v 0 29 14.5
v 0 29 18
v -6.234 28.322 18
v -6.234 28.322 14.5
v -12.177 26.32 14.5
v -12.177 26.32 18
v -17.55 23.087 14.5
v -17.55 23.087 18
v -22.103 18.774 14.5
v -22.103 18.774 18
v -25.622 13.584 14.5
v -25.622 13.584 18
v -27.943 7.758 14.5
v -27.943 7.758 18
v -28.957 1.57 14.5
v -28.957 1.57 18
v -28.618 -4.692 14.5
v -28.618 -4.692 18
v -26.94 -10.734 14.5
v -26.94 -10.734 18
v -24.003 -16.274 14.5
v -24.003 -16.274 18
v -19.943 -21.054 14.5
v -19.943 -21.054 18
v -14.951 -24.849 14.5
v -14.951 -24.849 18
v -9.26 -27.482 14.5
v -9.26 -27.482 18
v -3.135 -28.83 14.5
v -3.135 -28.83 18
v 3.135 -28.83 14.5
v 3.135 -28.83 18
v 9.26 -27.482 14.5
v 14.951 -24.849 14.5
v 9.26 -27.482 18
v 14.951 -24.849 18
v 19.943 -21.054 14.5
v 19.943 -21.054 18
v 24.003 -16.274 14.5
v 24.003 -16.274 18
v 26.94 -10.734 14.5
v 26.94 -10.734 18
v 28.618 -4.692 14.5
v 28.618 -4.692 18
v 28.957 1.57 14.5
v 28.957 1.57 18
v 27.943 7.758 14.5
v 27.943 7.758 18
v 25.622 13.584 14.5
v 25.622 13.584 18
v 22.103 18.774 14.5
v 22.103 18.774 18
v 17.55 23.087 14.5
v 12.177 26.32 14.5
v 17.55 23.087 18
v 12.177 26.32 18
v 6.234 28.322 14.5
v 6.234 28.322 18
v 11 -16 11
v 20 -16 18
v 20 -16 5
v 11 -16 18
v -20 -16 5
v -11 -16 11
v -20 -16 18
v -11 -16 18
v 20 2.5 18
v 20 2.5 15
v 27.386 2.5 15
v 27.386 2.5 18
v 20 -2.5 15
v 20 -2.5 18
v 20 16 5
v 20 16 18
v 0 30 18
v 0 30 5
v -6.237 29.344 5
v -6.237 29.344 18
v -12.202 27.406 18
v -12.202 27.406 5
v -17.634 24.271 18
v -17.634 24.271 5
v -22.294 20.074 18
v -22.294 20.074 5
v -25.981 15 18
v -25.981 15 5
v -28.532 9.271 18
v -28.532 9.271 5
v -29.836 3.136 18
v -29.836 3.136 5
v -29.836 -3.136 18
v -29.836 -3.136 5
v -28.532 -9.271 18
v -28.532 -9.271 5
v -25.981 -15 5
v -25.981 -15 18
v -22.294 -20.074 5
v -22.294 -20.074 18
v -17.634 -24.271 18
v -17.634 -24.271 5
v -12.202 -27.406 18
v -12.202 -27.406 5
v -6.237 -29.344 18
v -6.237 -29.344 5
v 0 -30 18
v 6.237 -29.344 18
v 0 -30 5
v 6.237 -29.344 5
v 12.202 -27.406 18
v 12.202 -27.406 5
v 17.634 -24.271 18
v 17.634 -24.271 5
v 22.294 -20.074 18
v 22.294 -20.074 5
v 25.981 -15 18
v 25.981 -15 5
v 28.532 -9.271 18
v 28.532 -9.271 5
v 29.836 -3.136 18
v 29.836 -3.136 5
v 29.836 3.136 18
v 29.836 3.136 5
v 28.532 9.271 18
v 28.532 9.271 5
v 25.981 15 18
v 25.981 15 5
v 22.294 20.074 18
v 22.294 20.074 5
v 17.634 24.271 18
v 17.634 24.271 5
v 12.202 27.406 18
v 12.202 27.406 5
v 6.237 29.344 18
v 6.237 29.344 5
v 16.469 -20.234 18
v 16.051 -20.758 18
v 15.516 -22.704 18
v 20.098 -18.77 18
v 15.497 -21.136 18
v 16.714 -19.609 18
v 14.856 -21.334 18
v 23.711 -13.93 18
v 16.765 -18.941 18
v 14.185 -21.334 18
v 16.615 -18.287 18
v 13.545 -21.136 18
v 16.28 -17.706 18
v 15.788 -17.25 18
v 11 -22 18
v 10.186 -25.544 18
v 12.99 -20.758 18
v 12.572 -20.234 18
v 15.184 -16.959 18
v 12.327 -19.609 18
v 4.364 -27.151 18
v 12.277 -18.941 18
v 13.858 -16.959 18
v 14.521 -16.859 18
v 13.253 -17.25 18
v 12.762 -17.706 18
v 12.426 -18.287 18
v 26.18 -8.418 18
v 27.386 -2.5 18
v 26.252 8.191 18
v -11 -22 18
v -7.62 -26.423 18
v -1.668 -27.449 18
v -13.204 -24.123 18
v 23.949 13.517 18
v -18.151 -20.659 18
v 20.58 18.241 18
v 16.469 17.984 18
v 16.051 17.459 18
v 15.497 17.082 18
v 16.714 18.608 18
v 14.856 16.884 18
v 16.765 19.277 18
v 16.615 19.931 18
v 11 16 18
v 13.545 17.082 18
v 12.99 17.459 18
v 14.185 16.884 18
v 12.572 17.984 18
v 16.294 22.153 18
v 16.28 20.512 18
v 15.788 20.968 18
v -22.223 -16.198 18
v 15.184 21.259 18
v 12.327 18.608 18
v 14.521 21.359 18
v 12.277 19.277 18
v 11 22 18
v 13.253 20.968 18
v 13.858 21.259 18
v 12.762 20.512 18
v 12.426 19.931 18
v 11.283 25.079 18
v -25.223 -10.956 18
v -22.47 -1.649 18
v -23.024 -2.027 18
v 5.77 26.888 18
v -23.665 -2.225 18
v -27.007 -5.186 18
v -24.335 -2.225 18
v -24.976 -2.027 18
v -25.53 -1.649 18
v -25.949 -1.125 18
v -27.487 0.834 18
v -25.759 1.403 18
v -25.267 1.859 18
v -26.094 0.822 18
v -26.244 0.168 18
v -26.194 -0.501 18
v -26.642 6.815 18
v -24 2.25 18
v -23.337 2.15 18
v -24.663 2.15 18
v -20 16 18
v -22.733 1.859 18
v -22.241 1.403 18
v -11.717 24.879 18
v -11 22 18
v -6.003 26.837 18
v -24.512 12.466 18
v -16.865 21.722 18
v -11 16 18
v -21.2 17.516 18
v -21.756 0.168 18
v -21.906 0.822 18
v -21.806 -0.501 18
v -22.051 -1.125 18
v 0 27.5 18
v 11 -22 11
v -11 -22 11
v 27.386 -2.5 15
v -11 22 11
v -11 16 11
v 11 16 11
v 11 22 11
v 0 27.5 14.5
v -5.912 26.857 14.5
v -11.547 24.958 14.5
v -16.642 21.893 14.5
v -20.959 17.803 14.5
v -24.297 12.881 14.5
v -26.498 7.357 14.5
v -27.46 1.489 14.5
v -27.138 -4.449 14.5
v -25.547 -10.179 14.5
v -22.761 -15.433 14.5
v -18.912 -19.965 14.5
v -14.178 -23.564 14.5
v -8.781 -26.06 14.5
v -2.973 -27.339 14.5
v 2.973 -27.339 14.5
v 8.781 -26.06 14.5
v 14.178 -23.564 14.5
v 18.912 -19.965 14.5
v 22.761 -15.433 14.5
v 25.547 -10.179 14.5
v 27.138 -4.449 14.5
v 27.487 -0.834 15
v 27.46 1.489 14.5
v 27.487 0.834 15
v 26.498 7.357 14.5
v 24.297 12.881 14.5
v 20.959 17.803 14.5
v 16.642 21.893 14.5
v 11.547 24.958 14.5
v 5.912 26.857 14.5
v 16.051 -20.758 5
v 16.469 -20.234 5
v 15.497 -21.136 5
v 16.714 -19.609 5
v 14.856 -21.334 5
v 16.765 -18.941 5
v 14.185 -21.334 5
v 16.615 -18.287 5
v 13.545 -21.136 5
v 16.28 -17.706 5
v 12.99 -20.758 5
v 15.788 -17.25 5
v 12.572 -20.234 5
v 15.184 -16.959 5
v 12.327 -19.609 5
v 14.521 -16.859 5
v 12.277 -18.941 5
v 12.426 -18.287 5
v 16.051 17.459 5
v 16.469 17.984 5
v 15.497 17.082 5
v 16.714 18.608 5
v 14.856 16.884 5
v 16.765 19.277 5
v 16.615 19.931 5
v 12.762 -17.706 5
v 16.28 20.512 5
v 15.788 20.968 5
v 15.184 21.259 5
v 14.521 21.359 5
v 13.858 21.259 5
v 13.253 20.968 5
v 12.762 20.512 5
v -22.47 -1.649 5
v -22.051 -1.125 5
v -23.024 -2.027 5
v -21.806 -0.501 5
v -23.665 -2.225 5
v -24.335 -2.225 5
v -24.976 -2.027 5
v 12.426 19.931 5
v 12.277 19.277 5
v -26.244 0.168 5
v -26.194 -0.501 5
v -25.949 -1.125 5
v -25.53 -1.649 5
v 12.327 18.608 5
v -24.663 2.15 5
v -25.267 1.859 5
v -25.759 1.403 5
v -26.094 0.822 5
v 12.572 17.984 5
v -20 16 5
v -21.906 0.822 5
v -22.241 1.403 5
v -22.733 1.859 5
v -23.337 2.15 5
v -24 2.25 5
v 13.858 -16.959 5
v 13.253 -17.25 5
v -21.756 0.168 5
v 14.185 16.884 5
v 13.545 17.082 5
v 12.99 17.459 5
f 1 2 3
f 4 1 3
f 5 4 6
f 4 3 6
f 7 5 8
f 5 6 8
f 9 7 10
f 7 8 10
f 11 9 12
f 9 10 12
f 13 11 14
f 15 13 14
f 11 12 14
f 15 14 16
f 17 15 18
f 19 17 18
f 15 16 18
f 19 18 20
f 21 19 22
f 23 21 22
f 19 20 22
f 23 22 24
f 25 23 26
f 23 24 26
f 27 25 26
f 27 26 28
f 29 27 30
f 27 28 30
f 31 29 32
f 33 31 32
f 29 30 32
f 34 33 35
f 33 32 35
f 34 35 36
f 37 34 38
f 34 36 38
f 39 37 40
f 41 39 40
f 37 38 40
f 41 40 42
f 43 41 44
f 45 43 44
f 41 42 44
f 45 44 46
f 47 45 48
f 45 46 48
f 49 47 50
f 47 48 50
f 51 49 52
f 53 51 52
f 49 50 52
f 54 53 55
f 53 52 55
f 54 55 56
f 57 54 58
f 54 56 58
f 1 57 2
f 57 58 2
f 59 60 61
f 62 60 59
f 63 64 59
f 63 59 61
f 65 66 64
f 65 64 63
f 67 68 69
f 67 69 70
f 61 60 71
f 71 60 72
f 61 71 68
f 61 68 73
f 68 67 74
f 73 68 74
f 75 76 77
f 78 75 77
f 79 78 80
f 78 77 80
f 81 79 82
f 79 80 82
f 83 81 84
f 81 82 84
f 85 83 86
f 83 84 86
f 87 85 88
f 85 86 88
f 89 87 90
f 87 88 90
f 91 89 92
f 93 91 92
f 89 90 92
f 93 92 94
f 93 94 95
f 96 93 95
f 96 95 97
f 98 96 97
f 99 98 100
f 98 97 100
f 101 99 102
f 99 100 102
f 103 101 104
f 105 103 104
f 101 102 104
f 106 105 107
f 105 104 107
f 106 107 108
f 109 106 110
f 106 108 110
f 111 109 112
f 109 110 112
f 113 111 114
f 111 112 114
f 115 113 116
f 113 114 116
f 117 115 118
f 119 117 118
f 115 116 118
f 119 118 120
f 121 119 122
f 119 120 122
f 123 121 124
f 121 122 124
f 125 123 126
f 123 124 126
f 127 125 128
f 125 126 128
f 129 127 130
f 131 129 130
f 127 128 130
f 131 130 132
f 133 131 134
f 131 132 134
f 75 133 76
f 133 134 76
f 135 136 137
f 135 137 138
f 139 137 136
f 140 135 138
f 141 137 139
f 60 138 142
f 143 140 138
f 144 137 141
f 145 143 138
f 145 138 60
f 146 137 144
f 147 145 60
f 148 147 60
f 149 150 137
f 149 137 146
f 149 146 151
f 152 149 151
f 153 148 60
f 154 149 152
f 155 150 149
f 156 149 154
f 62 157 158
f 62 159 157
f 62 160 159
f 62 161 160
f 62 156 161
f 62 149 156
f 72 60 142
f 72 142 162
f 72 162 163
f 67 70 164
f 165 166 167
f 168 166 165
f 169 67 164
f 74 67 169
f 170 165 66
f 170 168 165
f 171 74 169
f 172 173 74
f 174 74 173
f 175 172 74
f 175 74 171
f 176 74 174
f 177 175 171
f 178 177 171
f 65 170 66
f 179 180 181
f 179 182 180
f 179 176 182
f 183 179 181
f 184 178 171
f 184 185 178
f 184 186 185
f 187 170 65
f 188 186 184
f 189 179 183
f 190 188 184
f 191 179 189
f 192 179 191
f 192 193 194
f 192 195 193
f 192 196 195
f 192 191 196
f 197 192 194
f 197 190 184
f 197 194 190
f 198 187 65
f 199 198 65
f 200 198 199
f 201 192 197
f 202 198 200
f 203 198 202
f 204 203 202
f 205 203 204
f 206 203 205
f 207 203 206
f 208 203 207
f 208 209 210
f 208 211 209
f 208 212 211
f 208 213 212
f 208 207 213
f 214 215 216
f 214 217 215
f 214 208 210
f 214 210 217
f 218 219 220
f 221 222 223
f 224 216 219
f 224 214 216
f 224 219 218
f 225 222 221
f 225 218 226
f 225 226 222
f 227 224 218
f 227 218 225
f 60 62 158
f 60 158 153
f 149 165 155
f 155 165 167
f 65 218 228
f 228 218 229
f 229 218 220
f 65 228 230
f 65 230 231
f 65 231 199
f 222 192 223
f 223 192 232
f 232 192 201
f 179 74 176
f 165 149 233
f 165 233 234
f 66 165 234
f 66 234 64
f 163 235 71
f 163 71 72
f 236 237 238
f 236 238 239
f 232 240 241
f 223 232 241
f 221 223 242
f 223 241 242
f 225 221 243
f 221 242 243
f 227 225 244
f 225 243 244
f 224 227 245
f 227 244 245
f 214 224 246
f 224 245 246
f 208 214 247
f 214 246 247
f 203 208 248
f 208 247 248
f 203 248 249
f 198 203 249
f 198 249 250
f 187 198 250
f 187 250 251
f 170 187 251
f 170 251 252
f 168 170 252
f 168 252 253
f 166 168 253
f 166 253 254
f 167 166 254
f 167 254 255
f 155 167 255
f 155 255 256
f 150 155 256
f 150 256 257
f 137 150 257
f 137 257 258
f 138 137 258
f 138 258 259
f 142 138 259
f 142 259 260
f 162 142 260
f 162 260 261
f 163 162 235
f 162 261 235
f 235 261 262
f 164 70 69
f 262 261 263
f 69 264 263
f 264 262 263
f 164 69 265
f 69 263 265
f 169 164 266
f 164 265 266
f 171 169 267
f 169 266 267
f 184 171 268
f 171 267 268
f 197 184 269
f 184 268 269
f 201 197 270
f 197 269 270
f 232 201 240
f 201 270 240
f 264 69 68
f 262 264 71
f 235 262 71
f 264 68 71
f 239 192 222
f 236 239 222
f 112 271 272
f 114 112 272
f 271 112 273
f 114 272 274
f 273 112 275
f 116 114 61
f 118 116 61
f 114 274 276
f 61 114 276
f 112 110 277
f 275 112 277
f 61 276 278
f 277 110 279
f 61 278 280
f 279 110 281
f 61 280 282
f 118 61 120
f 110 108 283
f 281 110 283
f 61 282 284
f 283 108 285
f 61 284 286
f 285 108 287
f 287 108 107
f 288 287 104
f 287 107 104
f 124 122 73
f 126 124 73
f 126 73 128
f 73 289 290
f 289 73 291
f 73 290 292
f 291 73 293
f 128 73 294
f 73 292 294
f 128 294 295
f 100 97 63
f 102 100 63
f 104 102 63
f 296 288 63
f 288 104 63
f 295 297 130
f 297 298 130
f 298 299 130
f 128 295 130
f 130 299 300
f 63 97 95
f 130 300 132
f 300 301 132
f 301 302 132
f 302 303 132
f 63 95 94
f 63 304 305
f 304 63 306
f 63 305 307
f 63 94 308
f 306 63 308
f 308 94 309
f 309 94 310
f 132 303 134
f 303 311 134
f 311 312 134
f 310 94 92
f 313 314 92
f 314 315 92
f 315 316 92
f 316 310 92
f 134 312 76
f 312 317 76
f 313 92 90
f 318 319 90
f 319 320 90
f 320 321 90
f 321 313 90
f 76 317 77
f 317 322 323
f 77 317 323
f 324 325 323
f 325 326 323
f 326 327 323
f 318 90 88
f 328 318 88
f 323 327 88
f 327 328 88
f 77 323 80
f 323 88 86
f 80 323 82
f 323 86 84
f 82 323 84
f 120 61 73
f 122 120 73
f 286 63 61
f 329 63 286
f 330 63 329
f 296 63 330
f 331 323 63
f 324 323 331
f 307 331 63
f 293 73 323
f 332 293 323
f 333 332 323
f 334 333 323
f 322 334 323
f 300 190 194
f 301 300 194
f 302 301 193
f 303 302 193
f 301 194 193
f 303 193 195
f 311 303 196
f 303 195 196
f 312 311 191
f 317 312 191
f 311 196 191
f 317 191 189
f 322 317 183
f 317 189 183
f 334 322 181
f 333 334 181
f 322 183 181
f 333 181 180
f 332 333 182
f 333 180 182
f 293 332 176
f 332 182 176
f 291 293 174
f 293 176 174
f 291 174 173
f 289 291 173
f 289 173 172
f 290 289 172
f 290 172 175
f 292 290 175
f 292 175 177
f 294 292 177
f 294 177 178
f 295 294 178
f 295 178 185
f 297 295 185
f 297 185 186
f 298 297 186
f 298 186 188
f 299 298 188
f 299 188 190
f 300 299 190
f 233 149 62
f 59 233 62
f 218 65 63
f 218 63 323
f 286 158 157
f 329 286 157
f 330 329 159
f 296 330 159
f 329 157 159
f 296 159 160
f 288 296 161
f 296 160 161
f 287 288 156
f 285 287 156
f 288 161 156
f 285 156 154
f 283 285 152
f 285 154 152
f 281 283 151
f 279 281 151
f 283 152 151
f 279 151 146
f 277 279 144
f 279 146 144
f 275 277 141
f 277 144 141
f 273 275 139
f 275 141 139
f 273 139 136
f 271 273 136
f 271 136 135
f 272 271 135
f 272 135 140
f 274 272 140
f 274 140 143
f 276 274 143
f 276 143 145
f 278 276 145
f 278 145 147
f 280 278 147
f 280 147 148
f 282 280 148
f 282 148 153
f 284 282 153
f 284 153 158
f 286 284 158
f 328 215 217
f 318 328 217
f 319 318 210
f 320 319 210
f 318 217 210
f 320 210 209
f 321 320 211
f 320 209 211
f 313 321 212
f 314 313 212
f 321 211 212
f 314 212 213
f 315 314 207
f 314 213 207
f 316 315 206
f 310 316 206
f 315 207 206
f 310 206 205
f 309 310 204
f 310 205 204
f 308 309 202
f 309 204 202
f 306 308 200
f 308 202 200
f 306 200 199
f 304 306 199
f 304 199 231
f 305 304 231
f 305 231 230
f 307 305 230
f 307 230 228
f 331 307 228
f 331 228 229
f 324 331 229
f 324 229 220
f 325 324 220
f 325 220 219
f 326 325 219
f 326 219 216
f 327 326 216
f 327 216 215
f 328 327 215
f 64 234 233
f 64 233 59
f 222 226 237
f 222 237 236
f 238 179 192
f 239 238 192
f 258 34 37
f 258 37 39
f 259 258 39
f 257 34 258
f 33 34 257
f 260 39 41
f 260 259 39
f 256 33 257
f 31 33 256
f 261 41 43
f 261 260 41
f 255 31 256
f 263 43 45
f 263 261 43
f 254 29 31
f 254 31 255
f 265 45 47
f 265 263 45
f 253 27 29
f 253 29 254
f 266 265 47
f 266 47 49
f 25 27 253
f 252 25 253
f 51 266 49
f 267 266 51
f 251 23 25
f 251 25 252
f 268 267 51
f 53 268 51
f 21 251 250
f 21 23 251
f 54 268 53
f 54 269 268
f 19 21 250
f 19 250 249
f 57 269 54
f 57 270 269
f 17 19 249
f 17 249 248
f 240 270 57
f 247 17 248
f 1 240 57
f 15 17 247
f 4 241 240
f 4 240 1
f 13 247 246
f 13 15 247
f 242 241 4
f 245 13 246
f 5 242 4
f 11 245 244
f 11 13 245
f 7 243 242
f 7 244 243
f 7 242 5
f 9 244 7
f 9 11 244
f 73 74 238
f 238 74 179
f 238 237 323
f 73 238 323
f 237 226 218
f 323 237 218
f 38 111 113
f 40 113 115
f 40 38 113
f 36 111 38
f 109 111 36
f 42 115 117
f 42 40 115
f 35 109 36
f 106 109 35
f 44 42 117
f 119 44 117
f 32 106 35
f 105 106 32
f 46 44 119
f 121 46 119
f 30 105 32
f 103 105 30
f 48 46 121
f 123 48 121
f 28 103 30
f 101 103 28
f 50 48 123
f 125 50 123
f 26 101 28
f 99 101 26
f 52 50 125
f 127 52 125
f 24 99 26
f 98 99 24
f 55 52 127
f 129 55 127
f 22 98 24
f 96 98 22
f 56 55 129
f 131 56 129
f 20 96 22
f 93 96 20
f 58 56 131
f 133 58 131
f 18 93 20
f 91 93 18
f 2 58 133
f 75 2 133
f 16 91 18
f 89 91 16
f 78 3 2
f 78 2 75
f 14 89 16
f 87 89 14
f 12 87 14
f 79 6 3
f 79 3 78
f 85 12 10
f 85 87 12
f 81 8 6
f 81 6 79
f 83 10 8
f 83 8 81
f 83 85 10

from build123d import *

# Parameters (mm, degrees)
SKETCH005_R             = 30
PAD002_DEPTH            = 13
SKETCH006_R             = 29
POCKET001_DEPTH         = 3.5
SKETCH007_R             = 27.5
PAD003_DEPTH            = 3.5
SKETCH010_W             = 44
SKETCH010_H             = 22
POCKET003_DEPTH         = 7
SKETCH018_W             = 32
SKETCH018_H             = 40
POCKET011_DEPTH         = 13
SKETCH020_W             = 5
SKETCH020_H             = 3
POCKET012_DEPTH         = 8
SKETCH023_R             = 2.25
POCKET015_DEPTH         = 20
BODY002_PLACEMENT_ANGLE = 90


with BuildPart() as part:
    # Sketch005 → Pad002 (new body)
    with BuildSketch(Plane.XY):
        Circle(SKETCH005_R)
    extrude(amount=PAD002_DEPTH)

    # Sketch006 (on Face3 of Pad002) → Pocket001 (cut)
    with BuildSketch(Plane.XY.offset(13)):
        Circle(SKETCH006_R)
    extrude(amount=-POCKET001_DEPTH, mode=Mode.SUBTRACT)

    # Sketch007 (on Face5 of Pocket001) → Pad003 (join)
    with BuildSketch(Plane.XY.offset(9.5)):
        Circle(SKETCH007_R)
    extrude(amount=PAD003_DEPTH)

    # Sketch010 (on Face7 of Pad003) → Pocket003 (cut)
    with BuildSketch(Plane.XY.offset(13)):
        Rectangle(SKETCH010_W, SKETCH010_H)
    extrude(amount=-POCKET003_DEPTH, mode=Mode.SUBTRACT)

    # Sketch018 (on Face7 of Pocket003) → Pocket011 (cut)
    with BuildSketch(Plane.XY.offset(13)):
        Rectangle(SKETCH018_W, SKETCH018_H)
    extrude(amount=-POCKET011_DEPTH, mode=Mode.SUBTRACT)

    # Sketch020 (on Face5 of Pocket011) → Pocket012 (cut)
    with BuildSketch(Plane(origin=(0, -20, 0), x_dir=(-1, 0, 0), z_dir=(0, 1, 0))):
        with Locations((0, 11.5)):
            Rectangle(SKETCH020_W, SKETCH020_H)
    extrude(amount=-POCKET012_DEPTH, mode=Mode.SUBTRACT)

    # Sketch023 (on Face9 of Pocket012) → Pocket015 (cut)
    with BuildSketch(Plane.XY.offset(13)):
        with Locations((-19.108778, -14.520833)):
            Circle(SKETCH023_R)
        with Locations((0, 24)):
            Circle(SKETCH023_R)
        with Locations((19.108778, -14.520833)):
            Circle(SKETCH023_R)
    extrude(amount=-POCKET015_DEPTH, mode=Mode.SUBTRACT)


with BuildPart() as part_1:
    # Body002 placement: moved
    add(part.part.moved(Location((0, 0, 5))).rotate(Axis((0, 0, 5), (0, 0, 1)), BODY002_PLACEMENT_ANGLE))


solid = part_1.part
